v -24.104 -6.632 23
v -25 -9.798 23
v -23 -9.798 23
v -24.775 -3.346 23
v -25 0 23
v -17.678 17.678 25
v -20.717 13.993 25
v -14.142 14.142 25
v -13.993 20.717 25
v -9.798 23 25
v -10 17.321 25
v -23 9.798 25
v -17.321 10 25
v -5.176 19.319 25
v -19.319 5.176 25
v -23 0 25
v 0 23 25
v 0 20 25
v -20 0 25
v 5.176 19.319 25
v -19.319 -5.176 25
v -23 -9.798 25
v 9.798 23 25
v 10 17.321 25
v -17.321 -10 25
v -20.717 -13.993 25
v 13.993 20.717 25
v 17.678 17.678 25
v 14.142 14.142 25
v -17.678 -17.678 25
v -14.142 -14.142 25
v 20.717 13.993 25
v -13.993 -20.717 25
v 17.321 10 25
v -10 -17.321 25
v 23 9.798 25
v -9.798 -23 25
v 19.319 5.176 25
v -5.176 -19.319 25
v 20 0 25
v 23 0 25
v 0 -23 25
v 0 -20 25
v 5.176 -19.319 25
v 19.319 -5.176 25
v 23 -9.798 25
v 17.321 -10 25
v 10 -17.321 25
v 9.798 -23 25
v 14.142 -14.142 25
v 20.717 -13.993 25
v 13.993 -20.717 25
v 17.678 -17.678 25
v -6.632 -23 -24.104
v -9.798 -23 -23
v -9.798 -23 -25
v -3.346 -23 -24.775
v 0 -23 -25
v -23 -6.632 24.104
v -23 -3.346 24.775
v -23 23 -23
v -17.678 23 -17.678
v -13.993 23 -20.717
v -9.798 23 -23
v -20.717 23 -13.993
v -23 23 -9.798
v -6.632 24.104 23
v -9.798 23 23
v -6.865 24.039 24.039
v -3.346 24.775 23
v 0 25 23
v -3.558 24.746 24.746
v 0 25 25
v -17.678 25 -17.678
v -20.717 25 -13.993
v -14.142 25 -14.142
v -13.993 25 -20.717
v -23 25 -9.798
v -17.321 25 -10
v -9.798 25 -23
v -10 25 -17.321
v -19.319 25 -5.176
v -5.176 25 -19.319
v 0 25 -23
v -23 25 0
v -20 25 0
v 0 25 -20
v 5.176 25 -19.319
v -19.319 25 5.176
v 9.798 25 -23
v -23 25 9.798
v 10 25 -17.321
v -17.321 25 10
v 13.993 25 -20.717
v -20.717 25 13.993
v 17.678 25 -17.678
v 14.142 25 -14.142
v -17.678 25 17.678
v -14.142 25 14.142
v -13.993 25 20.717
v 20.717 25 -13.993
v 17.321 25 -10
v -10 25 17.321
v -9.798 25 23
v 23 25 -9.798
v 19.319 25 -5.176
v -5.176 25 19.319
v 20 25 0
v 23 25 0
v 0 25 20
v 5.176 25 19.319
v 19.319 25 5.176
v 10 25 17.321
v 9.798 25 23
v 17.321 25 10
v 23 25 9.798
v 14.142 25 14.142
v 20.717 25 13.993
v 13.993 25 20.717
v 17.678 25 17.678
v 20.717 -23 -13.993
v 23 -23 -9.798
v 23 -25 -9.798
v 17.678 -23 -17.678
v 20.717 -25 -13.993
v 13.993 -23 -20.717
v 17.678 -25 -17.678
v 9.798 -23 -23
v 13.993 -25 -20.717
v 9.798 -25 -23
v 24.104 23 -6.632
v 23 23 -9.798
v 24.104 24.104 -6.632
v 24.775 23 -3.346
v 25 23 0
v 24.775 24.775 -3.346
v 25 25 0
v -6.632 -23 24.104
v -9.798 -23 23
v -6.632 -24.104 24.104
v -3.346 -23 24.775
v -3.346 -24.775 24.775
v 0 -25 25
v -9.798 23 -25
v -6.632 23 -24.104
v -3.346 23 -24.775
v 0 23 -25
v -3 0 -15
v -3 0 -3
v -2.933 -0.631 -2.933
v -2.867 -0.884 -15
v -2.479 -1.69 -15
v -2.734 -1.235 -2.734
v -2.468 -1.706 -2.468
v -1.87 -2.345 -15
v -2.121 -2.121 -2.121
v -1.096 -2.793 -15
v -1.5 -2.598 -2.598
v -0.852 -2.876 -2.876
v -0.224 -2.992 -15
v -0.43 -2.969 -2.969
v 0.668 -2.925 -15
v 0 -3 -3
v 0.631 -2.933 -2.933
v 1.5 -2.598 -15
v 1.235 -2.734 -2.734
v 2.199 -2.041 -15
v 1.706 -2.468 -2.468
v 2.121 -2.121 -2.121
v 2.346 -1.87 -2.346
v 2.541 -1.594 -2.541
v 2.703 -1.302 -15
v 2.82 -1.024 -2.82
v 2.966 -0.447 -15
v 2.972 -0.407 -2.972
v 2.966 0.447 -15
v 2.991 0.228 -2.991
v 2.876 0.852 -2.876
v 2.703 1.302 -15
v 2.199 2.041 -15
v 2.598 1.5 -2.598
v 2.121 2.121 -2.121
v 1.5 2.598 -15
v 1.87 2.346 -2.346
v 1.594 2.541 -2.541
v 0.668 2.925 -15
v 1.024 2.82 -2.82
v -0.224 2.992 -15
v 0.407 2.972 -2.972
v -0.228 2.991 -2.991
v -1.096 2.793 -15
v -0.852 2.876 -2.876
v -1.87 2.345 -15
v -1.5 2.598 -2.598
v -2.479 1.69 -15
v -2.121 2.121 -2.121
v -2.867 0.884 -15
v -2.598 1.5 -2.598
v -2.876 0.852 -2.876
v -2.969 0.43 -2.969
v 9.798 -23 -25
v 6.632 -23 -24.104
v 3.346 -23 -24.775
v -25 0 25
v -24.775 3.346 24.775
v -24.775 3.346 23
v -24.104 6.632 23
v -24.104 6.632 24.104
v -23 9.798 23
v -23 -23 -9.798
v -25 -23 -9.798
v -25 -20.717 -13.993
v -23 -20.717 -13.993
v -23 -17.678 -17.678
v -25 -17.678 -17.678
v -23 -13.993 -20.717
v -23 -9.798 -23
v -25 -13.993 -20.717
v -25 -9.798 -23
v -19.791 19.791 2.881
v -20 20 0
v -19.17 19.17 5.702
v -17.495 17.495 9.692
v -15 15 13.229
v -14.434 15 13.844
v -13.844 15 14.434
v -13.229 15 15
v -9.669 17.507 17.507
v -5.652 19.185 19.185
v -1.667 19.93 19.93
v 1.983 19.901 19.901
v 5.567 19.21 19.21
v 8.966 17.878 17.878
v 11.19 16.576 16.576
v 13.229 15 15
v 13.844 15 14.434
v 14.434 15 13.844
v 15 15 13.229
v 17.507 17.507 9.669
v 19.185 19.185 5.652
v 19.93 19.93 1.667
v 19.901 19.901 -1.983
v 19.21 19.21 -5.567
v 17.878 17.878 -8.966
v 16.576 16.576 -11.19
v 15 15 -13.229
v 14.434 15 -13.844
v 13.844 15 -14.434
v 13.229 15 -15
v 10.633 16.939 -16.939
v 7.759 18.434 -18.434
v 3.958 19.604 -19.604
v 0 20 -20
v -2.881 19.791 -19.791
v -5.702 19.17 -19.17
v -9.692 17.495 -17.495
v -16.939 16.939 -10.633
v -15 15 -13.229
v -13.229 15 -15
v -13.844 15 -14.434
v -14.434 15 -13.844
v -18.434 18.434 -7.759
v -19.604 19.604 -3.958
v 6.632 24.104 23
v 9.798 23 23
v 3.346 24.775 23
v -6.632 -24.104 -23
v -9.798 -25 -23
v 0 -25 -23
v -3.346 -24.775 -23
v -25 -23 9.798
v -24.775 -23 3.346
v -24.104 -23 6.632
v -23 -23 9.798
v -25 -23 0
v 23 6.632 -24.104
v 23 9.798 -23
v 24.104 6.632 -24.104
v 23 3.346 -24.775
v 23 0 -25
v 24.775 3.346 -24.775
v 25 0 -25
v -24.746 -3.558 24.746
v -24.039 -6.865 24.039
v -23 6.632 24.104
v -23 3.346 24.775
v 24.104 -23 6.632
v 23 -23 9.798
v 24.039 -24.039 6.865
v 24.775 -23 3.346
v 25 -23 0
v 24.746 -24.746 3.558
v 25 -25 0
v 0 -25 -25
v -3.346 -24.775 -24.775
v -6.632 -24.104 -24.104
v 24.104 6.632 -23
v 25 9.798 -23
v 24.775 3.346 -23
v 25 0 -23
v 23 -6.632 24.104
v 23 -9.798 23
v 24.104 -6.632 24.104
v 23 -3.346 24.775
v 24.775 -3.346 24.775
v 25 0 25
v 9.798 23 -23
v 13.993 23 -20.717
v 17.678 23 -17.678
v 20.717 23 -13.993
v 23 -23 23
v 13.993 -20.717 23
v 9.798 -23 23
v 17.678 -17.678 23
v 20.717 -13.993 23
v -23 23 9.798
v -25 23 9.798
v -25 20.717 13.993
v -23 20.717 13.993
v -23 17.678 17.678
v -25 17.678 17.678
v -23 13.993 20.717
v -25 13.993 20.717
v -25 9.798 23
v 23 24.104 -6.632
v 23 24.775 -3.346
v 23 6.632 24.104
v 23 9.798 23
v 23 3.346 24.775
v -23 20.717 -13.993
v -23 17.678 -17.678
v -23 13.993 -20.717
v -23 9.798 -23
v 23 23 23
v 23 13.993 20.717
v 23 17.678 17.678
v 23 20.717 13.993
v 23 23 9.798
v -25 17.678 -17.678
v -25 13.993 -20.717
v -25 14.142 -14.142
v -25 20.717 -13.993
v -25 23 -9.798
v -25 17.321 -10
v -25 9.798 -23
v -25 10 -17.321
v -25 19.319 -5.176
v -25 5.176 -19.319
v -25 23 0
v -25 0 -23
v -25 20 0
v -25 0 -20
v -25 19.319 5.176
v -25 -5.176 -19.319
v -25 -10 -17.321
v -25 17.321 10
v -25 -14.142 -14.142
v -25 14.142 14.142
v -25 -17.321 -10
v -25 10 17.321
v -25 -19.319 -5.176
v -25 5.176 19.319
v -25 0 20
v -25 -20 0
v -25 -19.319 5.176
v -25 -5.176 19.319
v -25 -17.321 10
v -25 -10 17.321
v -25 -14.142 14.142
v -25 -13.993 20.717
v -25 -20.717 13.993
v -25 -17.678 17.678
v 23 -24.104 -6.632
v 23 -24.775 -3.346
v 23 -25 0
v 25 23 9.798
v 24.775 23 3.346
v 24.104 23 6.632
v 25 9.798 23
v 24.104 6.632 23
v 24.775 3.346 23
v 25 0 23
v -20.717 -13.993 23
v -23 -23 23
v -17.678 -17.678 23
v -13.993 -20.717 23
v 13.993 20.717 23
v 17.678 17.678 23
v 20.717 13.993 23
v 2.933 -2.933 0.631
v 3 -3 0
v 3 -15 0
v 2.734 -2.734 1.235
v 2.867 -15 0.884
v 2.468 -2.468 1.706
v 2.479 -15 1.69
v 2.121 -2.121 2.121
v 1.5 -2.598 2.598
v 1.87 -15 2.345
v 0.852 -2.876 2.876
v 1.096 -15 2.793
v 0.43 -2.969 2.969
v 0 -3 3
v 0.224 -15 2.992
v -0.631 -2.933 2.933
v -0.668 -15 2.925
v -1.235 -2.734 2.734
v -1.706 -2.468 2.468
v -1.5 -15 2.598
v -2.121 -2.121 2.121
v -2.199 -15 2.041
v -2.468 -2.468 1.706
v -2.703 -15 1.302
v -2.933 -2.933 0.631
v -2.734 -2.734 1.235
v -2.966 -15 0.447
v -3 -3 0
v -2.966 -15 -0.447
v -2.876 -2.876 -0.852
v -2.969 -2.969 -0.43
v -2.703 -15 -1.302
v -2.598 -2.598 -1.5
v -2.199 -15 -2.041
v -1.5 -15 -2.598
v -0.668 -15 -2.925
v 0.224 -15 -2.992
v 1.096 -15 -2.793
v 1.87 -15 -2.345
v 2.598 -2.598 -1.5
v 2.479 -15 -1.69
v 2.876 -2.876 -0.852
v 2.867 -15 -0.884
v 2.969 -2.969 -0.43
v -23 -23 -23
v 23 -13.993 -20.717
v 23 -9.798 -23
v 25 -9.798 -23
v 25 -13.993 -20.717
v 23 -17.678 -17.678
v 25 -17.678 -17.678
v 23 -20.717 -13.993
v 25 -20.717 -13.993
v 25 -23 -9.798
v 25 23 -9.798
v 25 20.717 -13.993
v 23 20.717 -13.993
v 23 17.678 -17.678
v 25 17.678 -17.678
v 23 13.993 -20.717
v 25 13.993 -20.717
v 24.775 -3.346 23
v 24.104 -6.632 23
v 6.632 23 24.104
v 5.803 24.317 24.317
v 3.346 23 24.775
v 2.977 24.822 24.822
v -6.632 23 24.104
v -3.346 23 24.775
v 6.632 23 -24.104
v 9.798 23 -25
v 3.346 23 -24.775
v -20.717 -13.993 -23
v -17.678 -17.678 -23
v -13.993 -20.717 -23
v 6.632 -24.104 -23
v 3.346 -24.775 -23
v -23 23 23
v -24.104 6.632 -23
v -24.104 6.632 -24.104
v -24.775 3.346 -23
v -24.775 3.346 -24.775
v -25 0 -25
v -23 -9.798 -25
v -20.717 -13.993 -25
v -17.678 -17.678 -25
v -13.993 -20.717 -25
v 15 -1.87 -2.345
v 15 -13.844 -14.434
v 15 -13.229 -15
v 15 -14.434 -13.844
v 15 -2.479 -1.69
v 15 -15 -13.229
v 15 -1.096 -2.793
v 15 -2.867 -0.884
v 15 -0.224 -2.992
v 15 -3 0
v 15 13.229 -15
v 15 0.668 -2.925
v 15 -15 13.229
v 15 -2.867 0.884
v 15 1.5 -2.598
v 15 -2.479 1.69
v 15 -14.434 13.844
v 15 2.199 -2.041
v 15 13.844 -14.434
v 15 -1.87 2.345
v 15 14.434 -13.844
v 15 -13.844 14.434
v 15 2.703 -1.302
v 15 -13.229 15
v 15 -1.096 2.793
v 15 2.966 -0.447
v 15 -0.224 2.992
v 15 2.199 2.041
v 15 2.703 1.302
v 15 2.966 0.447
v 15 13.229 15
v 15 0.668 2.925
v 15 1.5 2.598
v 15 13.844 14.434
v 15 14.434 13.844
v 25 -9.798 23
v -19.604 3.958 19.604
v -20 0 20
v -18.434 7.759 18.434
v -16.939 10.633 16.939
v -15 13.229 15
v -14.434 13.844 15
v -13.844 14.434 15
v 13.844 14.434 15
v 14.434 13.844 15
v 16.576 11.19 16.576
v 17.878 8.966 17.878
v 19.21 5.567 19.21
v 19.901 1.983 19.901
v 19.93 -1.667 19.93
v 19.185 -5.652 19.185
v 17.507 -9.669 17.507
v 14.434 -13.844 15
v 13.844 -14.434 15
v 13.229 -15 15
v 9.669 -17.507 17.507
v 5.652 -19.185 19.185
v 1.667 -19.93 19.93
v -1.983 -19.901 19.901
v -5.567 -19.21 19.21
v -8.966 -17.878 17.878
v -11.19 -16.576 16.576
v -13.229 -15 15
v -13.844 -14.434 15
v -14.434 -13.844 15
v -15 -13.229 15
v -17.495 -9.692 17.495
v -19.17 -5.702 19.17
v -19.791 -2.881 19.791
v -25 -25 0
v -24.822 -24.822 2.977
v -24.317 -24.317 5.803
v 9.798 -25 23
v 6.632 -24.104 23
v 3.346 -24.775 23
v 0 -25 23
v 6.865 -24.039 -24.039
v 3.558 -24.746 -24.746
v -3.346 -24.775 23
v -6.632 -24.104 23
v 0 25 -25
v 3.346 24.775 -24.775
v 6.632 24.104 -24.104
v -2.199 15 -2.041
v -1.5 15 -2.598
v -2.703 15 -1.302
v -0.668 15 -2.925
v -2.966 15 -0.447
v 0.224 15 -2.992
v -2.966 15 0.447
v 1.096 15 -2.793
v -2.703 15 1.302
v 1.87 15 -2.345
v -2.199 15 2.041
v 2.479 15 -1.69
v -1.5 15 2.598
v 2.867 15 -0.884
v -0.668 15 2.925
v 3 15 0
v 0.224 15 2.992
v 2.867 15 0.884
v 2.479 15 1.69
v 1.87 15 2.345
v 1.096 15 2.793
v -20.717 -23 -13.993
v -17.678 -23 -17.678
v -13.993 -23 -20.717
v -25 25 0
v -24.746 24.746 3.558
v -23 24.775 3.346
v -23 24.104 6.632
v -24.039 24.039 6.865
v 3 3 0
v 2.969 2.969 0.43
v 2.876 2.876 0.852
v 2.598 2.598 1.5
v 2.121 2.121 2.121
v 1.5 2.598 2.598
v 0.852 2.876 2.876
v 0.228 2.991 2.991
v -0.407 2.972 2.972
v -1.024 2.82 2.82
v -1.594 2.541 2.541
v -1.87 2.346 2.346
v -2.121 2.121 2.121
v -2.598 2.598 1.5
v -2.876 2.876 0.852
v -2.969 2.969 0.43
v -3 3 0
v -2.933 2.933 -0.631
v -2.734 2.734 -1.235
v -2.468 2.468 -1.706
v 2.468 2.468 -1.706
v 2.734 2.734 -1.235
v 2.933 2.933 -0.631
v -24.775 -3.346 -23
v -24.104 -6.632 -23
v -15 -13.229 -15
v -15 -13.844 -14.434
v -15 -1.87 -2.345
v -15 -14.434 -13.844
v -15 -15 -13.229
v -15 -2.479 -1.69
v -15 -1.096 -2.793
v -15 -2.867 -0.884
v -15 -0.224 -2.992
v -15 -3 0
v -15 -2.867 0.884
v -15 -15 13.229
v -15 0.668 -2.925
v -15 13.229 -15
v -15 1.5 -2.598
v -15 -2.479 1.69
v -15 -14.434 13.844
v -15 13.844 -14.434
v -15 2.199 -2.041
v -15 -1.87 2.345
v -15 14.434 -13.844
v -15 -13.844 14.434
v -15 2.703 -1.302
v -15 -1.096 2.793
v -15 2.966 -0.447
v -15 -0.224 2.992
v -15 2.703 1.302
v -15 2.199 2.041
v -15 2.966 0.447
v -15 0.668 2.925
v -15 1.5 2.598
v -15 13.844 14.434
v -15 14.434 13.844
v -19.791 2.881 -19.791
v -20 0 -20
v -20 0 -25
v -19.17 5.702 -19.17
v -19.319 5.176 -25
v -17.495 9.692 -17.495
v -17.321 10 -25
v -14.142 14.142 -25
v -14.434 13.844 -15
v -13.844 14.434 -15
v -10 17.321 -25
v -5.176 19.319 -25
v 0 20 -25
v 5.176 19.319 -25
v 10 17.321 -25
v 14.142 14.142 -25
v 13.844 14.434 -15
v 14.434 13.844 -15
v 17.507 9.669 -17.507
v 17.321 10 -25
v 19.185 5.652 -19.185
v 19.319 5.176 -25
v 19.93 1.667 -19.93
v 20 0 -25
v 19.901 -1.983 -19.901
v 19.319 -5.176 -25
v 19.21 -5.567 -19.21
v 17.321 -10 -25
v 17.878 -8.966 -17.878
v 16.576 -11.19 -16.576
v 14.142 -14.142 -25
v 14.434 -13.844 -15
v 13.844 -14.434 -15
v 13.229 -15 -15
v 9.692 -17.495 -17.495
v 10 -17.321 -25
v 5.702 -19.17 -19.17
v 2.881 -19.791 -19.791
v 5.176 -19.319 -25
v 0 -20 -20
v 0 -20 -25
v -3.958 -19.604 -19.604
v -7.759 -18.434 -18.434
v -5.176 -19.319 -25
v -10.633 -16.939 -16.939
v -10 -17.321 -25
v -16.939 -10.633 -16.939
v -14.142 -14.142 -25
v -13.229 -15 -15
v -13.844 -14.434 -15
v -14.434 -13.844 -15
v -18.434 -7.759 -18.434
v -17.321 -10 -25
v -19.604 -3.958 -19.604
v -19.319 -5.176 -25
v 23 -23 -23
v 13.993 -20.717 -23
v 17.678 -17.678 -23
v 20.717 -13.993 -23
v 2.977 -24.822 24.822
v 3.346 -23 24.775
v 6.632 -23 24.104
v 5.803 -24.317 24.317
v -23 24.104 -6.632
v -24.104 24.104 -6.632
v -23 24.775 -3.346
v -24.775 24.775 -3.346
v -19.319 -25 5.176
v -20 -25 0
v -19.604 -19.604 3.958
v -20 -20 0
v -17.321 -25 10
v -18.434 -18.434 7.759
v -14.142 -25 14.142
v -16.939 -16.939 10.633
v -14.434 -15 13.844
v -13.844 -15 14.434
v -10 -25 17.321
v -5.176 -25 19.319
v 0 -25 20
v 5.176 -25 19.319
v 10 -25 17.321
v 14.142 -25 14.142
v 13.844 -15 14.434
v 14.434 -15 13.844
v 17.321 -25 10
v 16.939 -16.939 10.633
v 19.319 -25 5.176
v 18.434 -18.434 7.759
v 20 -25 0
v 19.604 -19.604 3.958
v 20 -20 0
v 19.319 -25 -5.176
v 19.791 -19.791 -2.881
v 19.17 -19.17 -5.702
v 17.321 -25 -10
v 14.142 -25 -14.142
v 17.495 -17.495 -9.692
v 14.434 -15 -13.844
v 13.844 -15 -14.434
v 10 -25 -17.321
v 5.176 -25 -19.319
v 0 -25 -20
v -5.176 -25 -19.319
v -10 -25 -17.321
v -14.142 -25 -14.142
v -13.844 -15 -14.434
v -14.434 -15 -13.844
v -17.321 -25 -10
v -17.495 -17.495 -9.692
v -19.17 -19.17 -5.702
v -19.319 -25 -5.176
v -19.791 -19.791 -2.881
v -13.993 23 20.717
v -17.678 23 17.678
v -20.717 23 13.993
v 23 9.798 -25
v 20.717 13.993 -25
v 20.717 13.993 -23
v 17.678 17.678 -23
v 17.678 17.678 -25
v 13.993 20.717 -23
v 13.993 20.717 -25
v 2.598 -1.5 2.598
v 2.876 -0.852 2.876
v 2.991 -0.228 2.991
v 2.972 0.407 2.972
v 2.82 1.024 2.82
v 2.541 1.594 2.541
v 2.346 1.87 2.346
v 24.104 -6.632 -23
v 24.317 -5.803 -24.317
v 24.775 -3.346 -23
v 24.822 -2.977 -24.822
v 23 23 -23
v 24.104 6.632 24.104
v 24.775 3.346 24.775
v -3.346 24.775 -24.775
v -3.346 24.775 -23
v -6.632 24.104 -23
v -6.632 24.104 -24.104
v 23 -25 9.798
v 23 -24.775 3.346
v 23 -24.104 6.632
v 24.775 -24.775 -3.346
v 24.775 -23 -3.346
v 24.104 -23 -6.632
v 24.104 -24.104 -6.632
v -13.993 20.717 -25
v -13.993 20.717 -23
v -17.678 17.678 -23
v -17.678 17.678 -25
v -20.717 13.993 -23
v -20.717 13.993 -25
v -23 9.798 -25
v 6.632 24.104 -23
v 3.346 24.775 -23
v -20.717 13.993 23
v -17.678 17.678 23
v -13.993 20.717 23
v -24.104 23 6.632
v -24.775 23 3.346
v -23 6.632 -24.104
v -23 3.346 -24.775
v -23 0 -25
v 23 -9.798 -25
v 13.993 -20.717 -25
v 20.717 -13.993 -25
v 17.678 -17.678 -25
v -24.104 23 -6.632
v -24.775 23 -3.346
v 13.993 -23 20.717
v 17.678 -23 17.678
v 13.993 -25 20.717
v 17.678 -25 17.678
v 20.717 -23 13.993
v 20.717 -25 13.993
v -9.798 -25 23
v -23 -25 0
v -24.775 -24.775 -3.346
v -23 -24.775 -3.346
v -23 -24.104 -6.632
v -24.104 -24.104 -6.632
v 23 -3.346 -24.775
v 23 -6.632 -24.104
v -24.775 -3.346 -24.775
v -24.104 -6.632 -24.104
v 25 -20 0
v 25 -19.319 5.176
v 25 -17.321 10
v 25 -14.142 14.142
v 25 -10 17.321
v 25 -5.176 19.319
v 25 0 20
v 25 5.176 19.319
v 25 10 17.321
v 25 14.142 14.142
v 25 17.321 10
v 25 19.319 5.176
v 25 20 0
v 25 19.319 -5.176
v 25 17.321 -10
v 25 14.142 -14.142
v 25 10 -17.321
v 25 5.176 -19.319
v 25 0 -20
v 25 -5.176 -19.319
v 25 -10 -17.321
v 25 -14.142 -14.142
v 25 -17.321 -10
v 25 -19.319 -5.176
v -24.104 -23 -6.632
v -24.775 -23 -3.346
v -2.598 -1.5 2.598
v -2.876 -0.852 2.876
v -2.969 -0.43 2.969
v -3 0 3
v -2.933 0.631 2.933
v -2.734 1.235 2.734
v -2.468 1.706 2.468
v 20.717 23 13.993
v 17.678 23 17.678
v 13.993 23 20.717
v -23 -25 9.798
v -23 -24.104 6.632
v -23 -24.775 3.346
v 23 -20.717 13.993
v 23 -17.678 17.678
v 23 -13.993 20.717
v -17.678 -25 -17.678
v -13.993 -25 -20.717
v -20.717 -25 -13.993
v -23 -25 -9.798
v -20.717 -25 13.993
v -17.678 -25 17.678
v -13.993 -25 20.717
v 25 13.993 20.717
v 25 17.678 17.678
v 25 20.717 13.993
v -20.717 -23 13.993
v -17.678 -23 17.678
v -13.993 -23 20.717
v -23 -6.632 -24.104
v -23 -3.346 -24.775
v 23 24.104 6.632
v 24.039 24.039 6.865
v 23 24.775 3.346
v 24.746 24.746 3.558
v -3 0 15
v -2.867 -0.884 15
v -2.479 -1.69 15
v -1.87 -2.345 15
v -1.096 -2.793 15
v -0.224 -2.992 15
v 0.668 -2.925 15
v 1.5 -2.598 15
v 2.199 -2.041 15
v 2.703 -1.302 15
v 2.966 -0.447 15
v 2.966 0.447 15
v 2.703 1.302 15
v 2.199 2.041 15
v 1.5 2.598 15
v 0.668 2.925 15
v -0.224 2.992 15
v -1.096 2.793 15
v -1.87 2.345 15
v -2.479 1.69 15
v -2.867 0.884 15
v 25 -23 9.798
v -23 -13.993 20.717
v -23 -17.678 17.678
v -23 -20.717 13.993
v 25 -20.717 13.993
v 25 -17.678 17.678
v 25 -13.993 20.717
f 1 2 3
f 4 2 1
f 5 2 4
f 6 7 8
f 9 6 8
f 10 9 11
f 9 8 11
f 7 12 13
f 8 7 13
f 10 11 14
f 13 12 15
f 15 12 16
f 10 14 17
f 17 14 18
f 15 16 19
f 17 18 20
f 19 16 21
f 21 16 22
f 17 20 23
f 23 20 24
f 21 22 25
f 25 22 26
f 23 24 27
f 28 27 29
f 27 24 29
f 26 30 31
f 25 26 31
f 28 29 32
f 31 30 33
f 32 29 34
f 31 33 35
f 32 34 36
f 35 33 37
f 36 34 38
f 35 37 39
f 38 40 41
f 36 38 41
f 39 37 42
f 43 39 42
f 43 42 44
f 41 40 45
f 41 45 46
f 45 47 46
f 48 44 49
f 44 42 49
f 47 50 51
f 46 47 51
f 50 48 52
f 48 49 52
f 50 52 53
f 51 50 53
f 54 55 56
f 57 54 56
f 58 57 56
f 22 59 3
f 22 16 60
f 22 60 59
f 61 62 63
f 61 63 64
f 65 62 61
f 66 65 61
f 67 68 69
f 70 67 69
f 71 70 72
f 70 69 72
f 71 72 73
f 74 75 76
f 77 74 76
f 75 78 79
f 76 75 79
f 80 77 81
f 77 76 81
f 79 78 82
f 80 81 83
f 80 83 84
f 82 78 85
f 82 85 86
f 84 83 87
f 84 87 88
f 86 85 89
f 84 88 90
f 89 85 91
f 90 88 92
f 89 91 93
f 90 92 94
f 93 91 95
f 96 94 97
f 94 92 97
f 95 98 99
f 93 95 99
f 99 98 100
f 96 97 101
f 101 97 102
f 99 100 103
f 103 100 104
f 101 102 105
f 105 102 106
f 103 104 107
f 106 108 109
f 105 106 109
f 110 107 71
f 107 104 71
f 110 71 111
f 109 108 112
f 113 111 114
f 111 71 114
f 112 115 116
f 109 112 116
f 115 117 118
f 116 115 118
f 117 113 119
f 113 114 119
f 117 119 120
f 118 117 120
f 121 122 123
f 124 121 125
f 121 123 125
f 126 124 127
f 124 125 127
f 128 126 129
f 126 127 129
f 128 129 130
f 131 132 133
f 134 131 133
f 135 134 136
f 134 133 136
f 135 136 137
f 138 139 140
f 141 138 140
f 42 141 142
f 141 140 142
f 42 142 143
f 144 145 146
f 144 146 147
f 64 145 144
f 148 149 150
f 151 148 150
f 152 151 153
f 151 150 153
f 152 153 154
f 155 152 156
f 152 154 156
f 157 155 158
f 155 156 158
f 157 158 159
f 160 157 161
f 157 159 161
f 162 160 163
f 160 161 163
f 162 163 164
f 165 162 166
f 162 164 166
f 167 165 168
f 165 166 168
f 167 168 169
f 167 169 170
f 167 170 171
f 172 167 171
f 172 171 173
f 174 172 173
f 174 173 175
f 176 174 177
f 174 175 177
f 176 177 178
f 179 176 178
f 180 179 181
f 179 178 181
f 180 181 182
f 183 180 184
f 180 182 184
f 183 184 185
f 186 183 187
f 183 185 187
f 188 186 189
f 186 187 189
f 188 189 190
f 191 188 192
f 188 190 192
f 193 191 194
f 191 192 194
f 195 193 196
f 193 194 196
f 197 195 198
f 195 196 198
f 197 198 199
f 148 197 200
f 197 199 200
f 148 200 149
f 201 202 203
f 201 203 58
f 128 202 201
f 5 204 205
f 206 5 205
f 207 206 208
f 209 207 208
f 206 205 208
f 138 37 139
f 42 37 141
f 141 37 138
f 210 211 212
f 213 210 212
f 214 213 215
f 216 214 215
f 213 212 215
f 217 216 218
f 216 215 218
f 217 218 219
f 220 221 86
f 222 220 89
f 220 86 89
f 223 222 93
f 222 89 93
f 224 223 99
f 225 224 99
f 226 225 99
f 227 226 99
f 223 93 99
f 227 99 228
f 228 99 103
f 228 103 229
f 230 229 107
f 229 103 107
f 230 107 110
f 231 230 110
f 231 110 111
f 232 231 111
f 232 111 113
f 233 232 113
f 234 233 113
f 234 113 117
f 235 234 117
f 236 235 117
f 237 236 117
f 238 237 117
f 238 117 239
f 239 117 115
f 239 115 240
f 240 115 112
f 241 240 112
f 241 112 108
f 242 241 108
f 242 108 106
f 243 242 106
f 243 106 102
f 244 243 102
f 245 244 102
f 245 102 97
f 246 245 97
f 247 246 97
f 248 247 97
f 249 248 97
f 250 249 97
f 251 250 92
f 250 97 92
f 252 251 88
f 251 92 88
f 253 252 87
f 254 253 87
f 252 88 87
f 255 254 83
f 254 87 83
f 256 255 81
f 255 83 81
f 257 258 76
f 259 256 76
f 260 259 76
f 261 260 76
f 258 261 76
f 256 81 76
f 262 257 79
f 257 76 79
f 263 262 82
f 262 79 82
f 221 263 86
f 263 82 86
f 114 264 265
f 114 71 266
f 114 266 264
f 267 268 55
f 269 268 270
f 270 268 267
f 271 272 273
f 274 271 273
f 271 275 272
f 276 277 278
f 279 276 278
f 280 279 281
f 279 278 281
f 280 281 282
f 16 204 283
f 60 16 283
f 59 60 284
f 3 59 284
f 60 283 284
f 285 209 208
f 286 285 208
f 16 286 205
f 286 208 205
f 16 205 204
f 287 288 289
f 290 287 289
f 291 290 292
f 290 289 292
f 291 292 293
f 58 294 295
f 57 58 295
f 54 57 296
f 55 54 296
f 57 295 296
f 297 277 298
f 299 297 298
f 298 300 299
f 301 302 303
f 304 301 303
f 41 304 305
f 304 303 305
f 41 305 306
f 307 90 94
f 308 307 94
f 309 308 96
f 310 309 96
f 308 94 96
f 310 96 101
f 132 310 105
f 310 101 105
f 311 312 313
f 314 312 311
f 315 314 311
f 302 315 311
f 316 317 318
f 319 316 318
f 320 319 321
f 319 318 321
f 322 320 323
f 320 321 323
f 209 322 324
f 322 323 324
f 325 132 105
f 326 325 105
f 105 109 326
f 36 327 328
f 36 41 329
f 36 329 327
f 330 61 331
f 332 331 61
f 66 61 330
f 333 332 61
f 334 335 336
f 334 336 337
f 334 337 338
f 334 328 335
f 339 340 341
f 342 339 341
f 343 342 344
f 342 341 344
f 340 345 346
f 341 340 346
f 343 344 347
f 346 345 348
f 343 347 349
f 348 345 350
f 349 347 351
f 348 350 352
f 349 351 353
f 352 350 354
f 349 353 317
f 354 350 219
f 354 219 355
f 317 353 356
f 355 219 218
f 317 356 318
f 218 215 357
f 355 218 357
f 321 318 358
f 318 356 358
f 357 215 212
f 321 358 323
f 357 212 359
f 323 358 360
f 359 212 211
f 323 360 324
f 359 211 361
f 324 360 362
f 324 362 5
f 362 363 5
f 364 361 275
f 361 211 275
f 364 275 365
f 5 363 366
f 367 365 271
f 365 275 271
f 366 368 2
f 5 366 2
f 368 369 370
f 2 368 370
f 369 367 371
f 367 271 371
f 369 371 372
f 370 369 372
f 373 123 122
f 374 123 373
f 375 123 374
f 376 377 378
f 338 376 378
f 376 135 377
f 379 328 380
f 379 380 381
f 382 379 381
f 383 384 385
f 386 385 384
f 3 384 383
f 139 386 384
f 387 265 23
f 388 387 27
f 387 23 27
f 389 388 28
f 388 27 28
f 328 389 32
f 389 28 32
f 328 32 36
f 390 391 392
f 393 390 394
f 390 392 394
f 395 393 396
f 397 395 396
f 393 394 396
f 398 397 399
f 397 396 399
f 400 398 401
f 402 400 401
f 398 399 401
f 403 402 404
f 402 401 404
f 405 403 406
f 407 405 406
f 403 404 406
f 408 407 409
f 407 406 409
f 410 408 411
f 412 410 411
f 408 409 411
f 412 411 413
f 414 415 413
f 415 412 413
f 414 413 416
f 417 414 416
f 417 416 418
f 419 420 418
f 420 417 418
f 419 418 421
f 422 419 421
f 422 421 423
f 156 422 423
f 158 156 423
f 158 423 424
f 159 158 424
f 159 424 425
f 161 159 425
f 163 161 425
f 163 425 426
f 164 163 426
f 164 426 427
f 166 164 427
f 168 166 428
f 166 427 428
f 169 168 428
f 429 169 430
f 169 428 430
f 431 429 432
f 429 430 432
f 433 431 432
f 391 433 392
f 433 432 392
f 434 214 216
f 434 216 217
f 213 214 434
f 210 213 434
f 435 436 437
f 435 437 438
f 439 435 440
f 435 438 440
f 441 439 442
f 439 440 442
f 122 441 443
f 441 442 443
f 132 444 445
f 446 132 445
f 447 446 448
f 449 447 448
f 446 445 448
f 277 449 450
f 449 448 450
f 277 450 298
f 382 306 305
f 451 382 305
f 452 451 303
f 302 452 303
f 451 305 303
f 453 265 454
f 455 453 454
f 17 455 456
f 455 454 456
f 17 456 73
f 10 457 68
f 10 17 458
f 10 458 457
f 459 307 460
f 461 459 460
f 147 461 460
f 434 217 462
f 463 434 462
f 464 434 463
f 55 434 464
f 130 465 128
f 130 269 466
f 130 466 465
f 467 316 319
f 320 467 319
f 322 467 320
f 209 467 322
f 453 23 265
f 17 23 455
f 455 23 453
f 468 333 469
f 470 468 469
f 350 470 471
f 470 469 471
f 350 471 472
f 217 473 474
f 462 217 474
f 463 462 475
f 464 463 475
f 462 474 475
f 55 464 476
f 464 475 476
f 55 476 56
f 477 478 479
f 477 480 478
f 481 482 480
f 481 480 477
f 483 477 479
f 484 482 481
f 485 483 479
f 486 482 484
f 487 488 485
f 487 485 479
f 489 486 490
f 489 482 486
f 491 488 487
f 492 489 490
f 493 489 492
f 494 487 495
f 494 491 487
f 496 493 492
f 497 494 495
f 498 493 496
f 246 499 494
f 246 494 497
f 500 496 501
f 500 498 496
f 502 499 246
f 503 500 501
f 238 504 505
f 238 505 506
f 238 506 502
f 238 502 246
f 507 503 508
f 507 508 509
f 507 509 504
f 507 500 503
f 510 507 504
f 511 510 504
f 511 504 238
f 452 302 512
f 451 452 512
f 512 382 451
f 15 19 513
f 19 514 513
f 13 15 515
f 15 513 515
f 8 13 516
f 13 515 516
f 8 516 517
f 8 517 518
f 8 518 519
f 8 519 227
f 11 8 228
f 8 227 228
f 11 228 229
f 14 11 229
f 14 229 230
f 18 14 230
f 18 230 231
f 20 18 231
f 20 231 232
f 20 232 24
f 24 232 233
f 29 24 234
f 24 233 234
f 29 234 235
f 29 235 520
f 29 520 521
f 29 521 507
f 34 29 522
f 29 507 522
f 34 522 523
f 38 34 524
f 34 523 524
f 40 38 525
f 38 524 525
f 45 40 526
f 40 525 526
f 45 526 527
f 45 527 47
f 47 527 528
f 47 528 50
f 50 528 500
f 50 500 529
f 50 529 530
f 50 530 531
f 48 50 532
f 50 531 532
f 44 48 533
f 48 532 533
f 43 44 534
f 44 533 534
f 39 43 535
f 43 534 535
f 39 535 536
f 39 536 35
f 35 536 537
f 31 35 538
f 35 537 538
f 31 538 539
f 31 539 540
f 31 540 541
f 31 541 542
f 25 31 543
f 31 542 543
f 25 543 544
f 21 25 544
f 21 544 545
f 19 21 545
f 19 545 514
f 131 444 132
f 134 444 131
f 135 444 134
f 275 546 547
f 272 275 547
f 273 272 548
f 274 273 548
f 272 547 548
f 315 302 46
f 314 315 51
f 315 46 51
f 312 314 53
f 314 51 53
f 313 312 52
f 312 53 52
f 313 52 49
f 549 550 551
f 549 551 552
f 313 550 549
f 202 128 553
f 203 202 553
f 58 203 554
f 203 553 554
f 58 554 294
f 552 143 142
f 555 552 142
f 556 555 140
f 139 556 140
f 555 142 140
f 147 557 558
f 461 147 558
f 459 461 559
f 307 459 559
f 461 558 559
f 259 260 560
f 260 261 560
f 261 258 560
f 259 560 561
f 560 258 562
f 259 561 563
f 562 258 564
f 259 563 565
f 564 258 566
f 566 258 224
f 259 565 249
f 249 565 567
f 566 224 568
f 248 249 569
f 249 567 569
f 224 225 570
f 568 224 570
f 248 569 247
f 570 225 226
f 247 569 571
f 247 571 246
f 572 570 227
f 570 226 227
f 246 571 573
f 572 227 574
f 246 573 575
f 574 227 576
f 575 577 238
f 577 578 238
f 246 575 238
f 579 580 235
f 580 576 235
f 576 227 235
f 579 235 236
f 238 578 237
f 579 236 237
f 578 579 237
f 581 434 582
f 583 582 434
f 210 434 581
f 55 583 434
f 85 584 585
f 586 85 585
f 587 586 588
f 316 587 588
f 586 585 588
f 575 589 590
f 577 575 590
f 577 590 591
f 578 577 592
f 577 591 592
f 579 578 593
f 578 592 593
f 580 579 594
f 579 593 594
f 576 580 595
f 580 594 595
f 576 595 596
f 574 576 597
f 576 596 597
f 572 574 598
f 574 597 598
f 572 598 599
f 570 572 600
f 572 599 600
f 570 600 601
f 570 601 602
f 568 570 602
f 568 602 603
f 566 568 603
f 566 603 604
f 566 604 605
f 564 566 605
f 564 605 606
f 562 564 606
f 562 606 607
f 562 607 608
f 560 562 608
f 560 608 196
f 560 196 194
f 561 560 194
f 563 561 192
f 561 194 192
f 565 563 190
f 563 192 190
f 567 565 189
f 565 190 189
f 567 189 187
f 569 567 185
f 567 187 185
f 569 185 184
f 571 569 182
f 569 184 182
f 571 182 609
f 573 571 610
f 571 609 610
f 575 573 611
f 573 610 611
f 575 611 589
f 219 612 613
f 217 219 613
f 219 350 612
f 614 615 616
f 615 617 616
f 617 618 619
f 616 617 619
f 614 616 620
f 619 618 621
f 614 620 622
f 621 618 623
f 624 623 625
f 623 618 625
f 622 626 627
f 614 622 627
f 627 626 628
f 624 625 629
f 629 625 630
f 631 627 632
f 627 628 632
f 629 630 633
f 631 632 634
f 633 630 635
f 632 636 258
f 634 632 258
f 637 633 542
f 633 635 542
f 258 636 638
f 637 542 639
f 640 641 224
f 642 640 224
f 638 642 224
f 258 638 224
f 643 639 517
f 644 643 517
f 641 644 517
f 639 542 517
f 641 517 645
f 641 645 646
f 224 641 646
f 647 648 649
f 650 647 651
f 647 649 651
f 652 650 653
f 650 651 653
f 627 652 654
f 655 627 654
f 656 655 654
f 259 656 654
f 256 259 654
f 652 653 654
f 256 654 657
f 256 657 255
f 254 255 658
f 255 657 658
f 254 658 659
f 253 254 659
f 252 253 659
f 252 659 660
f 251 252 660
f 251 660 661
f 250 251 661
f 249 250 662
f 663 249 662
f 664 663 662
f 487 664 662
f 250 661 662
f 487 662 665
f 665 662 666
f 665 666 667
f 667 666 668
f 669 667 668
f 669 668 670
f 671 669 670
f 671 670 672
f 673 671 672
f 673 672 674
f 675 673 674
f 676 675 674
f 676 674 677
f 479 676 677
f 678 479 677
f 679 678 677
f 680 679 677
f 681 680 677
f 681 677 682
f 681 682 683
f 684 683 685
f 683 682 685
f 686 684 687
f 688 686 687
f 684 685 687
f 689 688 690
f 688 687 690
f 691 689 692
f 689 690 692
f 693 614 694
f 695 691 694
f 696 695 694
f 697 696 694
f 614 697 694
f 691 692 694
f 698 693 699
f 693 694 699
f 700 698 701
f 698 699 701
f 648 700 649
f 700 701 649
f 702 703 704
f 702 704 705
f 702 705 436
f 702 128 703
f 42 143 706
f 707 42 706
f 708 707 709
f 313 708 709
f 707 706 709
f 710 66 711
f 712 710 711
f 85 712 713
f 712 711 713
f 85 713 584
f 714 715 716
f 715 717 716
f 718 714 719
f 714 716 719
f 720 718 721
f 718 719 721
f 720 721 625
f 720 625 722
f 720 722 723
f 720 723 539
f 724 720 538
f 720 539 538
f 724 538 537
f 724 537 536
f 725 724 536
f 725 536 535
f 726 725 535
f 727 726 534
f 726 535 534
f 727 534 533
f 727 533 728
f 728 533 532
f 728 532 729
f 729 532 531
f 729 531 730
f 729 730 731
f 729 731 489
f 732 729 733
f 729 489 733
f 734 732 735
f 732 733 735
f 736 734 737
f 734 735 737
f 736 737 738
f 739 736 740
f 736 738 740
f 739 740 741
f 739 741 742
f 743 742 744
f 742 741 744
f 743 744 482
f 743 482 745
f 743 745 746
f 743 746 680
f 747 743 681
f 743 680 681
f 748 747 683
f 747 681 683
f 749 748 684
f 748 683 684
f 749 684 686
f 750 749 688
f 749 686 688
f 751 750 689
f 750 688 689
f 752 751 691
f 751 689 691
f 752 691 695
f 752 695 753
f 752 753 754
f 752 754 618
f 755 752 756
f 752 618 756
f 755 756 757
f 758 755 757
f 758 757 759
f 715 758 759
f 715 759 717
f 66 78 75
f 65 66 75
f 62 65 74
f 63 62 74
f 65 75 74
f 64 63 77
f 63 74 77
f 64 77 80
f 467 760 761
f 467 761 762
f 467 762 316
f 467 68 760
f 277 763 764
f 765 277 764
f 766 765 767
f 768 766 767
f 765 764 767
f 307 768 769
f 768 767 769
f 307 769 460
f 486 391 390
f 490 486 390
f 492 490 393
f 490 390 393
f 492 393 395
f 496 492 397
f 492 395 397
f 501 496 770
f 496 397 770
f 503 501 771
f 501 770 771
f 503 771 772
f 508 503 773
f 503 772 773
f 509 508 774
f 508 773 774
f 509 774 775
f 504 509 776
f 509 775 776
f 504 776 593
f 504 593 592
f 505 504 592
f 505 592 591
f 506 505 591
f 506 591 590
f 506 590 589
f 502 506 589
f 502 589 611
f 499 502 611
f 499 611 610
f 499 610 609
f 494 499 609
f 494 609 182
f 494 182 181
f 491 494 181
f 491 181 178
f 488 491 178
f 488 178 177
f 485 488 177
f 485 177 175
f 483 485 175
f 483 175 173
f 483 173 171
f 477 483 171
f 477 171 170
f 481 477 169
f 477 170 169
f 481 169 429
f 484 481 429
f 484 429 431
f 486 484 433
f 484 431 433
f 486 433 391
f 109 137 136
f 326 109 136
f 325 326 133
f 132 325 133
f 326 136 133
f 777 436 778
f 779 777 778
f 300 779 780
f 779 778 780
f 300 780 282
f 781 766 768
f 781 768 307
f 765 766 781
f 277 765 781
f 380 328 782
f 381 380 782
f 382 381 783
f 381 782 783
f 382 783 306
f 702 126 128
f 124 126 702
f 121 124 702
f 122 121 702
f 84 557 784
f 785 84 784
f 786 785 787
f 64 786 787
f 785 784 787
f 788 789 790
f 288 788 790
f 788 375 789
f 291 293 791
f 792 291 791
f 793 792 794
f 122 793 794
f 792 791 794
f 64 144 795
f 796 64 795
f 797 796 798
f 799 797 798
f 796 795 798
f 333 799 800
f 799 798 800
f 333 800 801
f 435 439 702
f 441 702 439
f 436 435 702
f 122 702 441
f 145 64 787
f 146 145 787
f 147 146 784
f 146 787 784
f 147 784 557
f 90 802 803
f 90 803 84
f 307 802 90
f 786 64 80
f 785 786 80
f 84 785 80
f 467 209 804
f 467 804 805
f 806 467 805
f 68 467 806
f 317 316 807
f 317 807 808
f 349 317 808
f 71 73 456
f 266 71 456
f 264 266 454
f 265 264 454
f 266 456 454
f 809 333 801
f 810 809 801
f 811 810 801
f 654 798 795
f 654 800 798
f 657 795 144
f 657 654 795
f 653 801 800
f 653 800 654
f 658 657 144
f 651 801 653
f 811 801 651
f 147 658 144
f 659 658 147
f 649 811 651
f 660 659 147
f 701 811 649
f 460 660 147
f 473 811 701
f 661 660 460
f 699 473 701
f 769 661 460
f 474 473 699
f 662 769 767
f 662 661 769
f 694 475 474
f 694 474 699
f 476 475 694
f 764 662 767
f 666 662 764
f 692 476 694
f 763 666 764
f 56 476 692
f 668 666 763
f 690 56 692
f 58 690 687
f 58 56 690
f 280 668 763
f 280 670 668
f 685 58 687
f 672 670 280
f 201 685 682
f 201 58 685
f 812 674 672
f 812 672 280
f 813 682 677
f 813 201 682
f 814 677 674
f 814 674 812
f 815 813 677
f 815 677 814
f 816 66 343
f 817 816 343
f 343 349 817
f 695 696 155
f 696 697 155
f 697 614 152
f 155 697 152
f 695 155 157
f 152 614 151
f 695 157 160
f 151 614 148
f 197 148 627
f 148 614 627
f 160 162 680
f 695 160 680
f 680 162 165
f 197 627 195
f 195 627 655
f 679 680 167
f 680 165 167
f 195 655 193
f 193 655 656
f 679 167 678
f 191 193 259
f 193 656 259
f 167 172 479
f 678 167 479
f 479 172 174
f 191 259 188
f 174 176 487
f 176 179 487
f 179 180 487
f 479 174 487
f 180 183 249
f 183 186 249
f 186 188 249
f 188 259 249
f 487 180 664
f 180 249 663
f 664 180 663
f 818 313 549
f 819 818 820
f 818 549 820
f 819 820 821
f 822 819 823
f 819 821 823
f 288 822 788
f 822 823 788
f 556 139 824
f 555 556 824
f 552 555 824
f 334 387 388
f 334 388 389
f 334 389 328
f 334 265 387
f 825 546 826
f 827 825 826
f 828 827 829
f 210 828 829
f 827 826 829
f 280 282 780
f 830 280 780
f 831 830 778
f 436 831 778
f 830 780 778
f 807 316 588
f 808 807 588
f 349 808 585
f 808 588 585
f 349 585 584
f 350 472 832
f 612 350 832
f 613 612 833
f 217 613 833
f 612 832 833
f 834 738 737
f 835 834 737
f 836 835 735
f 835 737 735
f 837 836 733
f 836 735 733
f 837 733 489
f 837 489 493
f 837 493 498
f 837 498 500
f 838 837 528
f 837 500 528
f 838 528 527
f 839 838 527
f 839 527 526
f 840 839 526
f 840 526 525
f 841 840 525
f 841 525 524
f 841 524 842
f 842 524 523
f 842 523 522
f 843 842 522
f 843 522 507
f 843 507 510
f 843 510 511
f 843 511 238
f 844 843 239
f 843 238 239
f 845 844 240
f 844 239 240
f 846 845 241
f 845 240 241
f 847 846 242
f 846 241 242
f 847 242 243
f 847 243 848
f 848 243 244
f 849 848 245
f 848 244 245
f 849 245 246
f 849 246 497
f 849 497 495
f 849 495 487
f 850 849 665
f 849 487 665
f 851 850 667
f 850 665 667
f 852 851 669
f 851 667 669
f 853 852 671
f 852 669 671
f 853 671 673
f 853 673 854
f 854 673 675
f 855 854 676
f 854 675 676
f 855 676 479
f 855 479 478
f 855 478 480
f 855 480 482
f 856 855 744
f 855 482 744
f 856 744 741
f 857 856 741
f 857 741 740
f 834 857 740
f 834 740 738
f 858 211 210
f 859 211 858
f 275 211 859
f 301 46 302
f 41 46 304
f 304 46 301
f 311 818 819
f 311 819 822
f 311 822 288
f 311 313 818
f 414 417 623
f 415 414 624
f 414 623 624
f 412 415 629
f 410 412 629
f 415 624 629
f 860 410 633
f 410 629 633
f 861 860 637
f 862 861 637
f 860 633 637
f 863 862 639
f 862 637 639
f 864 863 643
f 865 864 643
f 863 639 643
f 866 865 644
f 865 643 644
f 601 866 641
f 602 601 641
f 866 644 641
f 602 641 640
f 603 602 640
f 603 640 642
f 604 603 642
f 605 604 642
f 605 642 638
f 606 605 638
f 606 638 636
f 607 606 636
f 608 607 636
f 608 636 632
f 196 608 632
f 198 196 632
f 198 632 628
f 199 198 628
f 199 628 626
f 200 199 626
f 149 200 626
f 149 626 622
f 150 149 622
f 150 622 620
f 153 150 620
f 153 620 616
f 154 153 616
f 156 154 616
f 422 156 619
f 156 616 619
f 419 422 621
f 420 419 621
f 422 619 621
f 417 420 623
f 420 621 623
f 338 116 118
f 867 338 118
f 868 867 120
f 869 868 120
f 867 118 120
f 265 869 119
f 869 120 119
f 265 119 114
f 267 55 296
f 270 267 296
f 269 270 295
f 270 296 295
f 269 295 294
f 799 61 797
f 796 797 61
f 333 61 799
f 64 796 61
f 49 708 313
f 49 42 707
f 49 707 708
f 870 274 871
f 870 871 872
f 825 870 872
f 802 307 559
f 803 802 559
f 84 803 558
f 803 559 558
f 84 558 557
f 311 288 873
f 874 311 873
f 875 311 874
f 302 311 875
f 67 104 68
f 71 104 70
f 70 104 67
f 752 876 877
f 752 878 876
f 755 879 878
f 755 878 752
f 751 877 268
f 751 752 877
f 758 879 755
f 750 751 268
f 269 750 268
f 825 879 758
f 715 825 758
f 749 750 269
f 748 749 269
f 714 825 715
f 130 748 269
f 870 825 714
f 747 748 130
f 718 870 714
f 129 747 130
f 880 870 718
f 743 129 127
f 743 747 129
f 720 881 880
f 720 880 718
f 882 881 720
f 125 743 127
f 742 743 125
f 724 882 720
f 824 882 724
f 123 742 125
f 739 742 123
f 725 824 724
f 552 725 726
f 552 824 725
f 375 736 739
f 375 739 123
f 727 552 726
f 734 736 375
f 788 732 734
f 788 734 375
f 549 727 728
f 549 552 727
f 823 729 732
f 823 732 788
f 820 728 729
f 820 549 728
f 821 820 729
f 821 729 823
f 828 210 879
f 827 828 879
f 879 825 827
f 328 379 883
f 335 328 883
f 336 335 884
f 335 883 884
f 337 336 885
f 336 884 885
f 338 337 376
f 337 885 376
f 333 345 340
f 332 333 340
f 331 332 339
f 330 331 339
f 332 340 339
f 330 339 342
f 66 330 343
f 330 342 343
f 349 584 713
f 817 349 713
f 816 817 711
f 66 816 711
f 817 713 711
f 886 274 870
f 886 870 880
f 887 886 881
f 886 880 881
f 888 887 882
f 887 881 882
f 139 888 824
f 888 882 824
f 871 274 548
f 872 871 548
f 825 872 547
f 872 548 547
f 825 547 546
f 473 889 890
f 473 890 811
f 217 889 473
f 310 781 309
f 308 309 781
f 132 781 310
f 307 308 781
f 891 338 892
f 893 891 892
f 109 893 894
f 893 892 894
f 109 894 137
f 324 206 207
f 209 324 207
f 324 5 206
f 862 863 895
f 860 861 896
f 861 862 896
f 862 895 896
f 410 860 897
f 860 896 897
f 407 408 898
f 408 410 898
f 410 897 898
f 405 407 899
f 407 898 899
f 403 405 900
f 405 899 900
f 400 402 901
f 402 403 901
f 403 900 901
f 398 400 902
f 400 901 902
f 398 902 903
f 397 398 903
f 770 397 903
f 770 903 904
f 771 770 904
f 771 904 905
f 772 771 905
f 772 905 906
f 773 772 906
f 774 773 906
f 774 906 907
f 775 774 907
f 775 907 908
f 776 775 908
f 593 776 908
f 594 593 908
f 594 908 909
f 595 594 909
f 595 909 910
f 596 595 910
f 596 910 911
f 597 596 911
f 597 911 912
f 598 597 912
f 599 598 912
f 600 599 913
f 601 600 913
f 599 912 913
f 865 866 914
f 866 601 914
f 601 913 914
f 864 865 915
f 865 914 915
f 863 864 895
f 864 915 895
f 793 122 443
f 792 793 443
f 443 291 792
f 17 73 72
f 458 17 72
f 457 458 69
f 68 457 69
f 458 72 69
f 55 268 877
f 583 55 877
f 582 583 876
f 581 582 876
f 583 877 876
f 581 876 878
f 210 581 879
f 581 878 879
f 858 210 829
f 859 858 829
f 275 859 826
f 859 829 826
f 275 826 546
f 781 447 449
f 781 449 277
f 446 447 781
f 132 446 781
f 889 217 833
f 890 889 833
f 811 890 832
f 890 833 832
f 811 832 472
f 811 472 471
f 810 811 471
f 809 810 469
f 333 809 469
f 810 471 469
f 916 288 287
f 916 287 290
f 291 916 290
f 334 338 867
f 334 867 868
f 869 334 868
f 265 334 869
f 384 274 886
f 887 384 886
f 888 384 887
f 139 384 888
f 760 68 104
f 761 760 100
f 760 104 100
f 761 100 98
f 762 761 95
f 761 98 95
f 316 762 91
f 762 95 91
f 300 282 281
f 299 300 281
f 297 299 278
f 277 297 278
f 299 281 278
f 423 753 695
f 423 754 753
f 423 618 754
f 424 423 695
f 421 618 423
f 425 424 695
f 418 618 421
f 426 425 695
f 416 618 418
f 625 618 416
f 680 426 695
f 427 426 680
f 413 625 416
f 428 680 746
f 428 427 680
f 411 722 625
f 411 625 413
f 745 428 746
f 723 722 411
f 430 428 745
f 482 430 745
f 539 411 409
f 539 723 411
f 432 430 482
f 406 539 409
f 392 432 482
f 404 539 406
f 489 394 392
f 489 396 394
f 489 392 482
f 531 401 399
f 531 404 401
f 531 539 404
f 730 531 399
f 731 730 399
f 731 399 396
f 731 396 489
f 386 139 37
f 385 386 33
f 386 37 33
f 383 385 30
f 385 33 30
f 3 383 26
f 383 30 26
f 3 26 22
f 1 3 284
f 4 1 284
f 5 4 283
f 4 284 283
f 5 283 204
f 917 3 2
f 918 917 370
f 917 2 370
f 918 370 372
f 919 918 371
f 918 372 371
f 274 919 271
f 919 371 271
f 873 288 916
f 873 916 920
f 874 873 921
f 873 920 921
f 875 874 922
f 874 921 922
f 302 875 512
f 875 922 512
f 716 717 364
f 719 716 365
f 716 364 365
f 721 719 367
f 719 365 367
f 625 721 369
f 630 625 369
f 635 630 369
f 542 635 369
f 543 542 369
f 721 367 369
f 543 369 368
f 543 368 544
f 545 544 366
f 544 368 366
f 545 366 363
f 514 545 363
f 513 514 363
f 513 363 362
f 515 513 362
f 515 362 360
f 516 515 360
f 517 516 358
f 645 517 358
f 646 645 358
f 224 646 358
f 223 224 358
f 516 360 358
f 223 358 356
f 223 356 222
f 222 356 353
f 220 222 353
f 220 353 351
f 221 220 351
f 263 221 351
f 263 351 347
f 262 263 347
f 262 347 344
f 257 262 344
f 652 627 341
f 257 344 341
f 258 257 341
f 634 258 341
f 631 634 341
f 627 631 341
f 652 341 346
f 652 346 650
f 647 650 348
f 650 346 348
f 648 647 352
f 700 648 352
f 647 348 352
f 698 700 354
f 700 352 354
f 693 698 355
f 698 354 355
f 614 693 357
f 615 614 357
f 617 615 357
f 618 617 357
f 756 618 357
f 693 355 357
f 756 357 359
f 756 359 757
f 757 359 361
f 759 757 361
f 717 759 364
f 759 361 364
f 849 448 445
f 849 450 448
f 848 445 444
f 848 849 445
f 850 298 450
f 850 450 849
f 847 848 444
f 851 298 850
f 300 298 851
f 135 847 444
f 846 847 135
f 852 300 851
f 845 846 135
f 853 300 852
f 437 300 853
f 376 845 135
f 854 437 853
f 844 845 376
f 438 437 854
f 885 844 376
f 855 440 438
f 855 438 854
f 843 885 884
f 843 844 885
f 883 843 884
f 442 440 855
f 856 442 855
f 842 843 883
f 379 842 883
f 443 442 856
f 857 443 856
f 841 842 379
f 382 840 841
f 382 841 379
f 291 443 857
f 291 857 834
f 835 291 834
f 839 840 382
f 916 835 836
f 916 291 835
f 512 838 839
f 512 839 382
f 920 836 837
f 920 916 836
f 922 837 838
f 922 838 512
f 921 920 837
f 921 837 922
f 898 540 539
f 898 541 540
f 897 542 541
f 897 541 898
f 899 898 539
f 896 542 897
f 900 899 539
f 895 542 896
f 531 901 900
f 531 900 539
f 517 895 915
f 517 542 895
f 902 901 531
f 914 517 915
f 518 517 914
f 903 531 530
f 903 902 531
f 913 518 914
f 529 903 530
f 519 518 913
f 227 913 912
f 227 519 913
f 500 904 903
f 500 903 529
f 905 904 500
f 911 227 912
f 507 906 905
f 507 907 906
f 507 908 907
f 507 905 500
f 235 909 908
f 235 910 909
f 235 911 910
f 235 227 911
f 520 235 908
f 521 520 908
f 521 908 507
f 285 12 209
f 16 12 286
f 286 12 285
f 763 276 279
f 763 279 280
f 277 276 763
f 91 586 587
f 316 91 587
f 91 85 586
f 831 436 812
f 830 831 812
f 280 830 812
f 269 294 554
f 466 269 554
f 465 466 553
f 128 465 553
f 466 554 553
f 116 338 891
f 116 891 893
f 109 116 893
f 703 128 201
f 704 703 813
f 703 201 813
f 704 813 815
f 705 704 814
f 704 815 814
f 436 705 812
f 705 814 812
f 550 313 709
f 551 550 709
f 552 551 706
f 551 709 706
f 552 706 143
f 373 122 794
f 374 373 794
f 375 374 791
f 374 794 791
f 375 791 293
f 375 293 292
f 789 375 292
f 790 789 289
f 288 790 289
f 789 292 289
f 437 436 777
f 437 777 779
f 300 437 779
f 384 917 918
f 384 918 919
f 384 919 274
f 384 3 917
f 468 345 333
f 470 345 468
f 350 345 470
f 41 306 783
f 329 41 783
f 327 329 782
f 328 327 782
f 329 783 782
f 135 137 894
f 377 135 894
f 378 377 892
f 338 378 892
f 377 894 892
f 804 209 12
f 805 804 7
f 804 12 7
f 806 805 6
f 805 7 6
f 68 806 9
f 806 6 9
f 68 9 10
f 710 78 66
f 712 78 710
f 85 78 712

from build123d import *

# Parameters (mm, degrees)
F0_W          = 50
F0_H          = 50
F1_DEPTH      = 25
F1_DEPTH_BACK = 25
F3_D          = 40
F5_D          = 40
F7_D          = 40
F8_W          = 30
F8_H          = 30
F9_DEPTH      = 15
F9_DEPTH_BACK = 15
F17_DEPTH     = 2
F18_DEPTH     = 2
F19_DEPTH     = 2
F20_DEPTH     = 2
F21_DEPTH     = 2
F22_DEPTH     = 2
F23_DEPTH     = 2
F25_D         = 6
F27_D         = 6
F29_D         = 6


with BuildPart() as f1:
    # F0 (on Front) → F1 (new body, two sides)
    with BuildSketch(Plane.XZ) as f1_sk:
        Rectangle(F0_W, F0_H)
    extrude(amount=F1_DEPTH)
    extrude(f1_sk.sketch, amount=-F1_DEPTH_BACK)

    # F3 (through all)
    with Locations(Plane.YZ.offset(25)):
        with Locations((0, 0)):
            Hole(F3_D / 2)

    # F5 (through all)
    with Locations(Plane.XY.offset(25)):
        with Locations((0, 0)):
            Hole(F5_D / 2)

    # F7 (through all)
    with Locations(Plane.XZ.offset(25)):
        with Locations((0, 0)):
            Hole(F7_D / 2)

    # F8 (on Top) → F9 (join, two sides)
    with BuildSketch(Plane.XY) as f9_sk:
        Rectangle(F8_W, F8_H)
    extrude(amount=F9_DEPTH)
    extrude(f9_sk.sketch, amount=-F9_DEPTH_BACK)

    # F10 (on face) → F17 (cut)
    with BuildSketch(Plane(origin=(0, 25, 0), x_dir=(-1, 0, 0), z_dir=(0, 1, 0))):
        with BuildLine():
            ThreePointArc((0, 25), (17.6776695297, 17.6776695297), (25, 0))
            Line((25, 0), (25, 25))
            Line((25, 25), (0, 25))
        make_face()
        with BuildLine():
            ThreePointArc((-25, 2.61e-08), (-17.6776695204, 17.6776695389), (0, 25))
            Line((0, 25), (-25, 25))
            Line((-25, 25), (-25, 2.61e-08))
        make_face()
        with BuildLine():
            Line((-25, -25), (-5.83e-08, -25))
            ThreePointArc((-5.83e-08, -25), (-17.6776695595, -17.6776694998), (-25, 2.61e-08))
            Line((-25, 2.61e-08), (-25, -25))
        make_face()
        with BuildLine():
            Line((25, -25), (25, 0))
            ThreePointArc((25, 0), (17.677669509, -17.6776695503), (-5.83e-08, -25))
            Line((-5.83e-08, -25), (25, -25))
        make_face()
    extrude(amount=F17_DEPTH, mode=Mode.SUBTRACT)

    # F15 (on face) → F18 (cut)
    with BuildSketch(Plane.XZ.offset(25)):
        with BuildLine():
            ThreePointArc((-25, 2.61e-08), (-17.6776695204, 17.6776695389), (0, 25))
            Line((0, 25), (-25, 25))
            Line((-25, 25), (-25, 2.61e-08))
        make_face()
        with BuildLine():
            Line((-25, -25), (-5.83e-08, -25))
            ThreePointArc((-5.83e-08, -25), (-17.6776695595, -17.6776694998), (-25, 2.61e-08))
            Line((-25, 2.61e-08), (-25, -25))
        make_face()
        with BuildLine():
            Line((25, -25), (25, 0))
            ThreePointArc((25, 0), (17.677669509, -17.6776695503), (-5.83e-08, -25))
            Line((-5.83e-08, -25), (25, -25))
        make_face()
        with BuildLine():
            ThreePointArc((0, 25), (17.6776695297, 17.6776695297), (25, 0))
            Line((25, 0), (25, 25))
            Line((25, 25), (0, 25))
        make_face()
    extrude(amount=-F18_DEPTH, mode=Mode.SUBTRACT)

    # F12 (on face) → F19 (cut)
    with BuildSketch(Plane.XY.offset(25)):
        with BuildLine():
            Line((-25, -25), (-5.83e-08, -25))
            ThreePointArc((-5.83e-08, -25), (-17.6776695595, -17.6776694998), (-25, 2.61e-08))
            Line((-25, 2.61e-08), (-25, -25))
        make_face()
        with BuildLine():
            ThreePointArc((-25, 2.61e-08), (-17.6776695204, 17.6776695389), (0, 25))
            Line((0, 25), (-25, 25))
            Line((-25, 25), (-25, 2.61e-08))
        make_face()
        with BuildLine():
            ThreePointArc((0, 25), (17.6776695297, 17.6776695297), (25, 0))
            Line((25, 0), (25, 25))
            Line((25, 25), (0, 25))
        make_face()
        with BuildLine():
            Line((25, -25), (25, 0))
            ThreePointArc((25, 0), (17.677669509, -17.6776695503), (-5.83e-08, -25))
            Line((-5.83e-08, -25), (25, -25))
        make_face()
    extrude(amount=-F19_DEPTH, mode=Mode.SUBTRACT)

    # F13 (on face) → F20 (cut)
    with BuildSketch(Plane.YZ.offset(25)):
        with BuildLine():
            ThreePointArc((-25, 2.61e-08), (-17.6776695204, 17.6776695389), (0, 25))
            Line((0, 25), (-25, 25))
            Line((-25, 25), (-25, 2.61e-08))
        make_face()
        with BuildLine():
            ThreePointArc((0, 25), (17.6776695297, 17.6776695297), (25, 0))
            Line((25, 0), (25, 25))
            Line((25, 25), (0, 25))
        make_face()
        with BuildLine():
            Line((25, -25), (25, 0))
            ThreePointArc((25, 0), (17.677669509, -17.6776695503), (-5.83e-08, -25))
            Line((-5.83e-08, -25), (25, -25))
        make_face()
        with BuildLine():
            Line((-25, -25), (-5.83e-08, -25))
            ThreePointArc((-5.83e-08, -25), (-17.6776695595, -17.6776694998), (-25, 2.61e-08))
            Line((-25, 2.61e-08), (-25, -25))
        make_face()
    extrude(amount=-F20_DEPTH, mode=Mode.SUBTRACT)

    # F16 (on face) → F21 (cut)
    with BuildSketch(Plane(origin=(0, 25, 0), x_dir=(-1, 0, 0), z_dir=(0, 1, 0))):
        with BuildLine():
            ThreePointArc((-25, 2.61e-08), (-17.6776695204, 17.6776695389), (0, 25))
            Line((0, 25), (-25, 25))
            Line((-25, 25), (-25, 2.61e-08))
        make_face()
        with BuildLine():
            ThreePointArc((0, 25), (17.6776695297, 17.6776695297), (25, 0))
            Line((25, 0), (25, 25))
            Line((25, 25), (0, 25))
        make_face()
        with BuildLine():
            Line((25, -25), (25, 0))
            ThreePointArc((25, 0), (17.677669509, -17.6776695503), (-5.83e-08, -25))
            Line((-5.83e-08, -25), (25, -25))
        make_face()
        with BuildLine():
            Line((-25, -25), (-5.83e-08, -25))
            ThreePointArc((-5.83e-08, -25), (-17.6776695595, -17.6776694998), (-25, 2.61e-08))
            Line((-25, 2.61e-08), (-25, -25))
        make_face()
    extrude(amount=-F21_DEPTH, mode=Mode.SUBTRACT)

    # F11 (on face) → F22 (cut)
    with BuildSketch(Plane(origin=(-25, 0, 0), x_dir=(0, -1, 0), z_dir=(-1, 0, 0))):
        with BuildLine():
            ThreePointArc((-25, 2.61e-08), (-17.6776695204, 17.6776695389), (0, 25))
            Line((0, 25), (-25, 25))
            Line((-25, 25), (-25, 2.61e-08))
        make_face()
        with BuildLine():
            ThreePointArc((0, 25), (17.6776695297, 17.6776695297), (25, 0))
            Line((25, 0), (25, 25))
            Line((25, 25), (0, 25))
        make_face()
        with BuildLine():
            Line((25, -25), (25, 0))
            ThreePointArc((25, 0), (17.677669509, -17.6776695503), (-5.83e-08, -25))
            Line((-5.83e-08, -25), (25, -25))
        make_face()
        with BuildLine():
            Line((-25, -25), (-5.83e-08, -25))
            ThreePointArc((-5.83e-08, -25), (-17.6776695595, -17.6776694998), (-25, 2.61e-08))
            Line((-25, 2.61e-08), (-25, -25))
        make_face()
    extrude(amount=-F22_DEPTH, mode=Mode.SUBTRACT)

    # F14 (on face) → F23 (cut)
    with BuildSketch(Plane(origin=(0, 0, -25), x_dir=(1, 0, 0), z_dir=(0, 0, -1))):
        with BuildLine():
            ThreePointArc((-25, 2.61e-08), (-17.6776695204, 17.6776695389), (0, 25))
            Line((0, 25), (-25, 25))
            Line((-25, 25), (-25, 2.61e-08))
        make_face()
        with BuildLine():
            Line((-25, -25), (-5.83e-08, -25))
            ThreePointArc((-5.83e-08, -25), (-17.6776695595, -17.6776694998), (-25, 2.61e-08))
            Line((-25, 2.61e-08), (-25, -25))
        make_face()
        with BuildLine():
            Line((25, -25), (25, 0))
            ThreePointArc((25, 0), (17.677669509, -17.6776695503), (-5.83e-08, -25))
            Line((-5.83e-08, -25), (25, -25))
        make_face()
        with BuildLine():
            ThreePointArc((0, 25), (17.6776695297, 17.6776695297), (25, 0))
            Line((25, 0), (25, 25))
            Line((25, 25), (0, 25))
        make_face()
    extrude(amount=-F23_DEPTH, mode=Mode.SUBTRACT)

    # F25 (through all)
    with Locations(Plane.YZ.offset(15)):
        with Locations((0, 0)):
            Hole(F25_D / 2)

    # F27 (through all)
    with Locations(Plane(origin=(0, 15, 0), x_dir=(-1, 0, 0), z_dir=(0, 1, 0))):
        with Locations((0, 0)):
            Hole(F27_D / 2)

    # F29 (through all)
    with Locations(Plane(origin=(0, 0, -15), x_dir=(1, 0, 0), z_dir=(0, 0, -1))):
        with Locations((0, 0)):
            Hole(F29_D / 2)


solid = f1.part
